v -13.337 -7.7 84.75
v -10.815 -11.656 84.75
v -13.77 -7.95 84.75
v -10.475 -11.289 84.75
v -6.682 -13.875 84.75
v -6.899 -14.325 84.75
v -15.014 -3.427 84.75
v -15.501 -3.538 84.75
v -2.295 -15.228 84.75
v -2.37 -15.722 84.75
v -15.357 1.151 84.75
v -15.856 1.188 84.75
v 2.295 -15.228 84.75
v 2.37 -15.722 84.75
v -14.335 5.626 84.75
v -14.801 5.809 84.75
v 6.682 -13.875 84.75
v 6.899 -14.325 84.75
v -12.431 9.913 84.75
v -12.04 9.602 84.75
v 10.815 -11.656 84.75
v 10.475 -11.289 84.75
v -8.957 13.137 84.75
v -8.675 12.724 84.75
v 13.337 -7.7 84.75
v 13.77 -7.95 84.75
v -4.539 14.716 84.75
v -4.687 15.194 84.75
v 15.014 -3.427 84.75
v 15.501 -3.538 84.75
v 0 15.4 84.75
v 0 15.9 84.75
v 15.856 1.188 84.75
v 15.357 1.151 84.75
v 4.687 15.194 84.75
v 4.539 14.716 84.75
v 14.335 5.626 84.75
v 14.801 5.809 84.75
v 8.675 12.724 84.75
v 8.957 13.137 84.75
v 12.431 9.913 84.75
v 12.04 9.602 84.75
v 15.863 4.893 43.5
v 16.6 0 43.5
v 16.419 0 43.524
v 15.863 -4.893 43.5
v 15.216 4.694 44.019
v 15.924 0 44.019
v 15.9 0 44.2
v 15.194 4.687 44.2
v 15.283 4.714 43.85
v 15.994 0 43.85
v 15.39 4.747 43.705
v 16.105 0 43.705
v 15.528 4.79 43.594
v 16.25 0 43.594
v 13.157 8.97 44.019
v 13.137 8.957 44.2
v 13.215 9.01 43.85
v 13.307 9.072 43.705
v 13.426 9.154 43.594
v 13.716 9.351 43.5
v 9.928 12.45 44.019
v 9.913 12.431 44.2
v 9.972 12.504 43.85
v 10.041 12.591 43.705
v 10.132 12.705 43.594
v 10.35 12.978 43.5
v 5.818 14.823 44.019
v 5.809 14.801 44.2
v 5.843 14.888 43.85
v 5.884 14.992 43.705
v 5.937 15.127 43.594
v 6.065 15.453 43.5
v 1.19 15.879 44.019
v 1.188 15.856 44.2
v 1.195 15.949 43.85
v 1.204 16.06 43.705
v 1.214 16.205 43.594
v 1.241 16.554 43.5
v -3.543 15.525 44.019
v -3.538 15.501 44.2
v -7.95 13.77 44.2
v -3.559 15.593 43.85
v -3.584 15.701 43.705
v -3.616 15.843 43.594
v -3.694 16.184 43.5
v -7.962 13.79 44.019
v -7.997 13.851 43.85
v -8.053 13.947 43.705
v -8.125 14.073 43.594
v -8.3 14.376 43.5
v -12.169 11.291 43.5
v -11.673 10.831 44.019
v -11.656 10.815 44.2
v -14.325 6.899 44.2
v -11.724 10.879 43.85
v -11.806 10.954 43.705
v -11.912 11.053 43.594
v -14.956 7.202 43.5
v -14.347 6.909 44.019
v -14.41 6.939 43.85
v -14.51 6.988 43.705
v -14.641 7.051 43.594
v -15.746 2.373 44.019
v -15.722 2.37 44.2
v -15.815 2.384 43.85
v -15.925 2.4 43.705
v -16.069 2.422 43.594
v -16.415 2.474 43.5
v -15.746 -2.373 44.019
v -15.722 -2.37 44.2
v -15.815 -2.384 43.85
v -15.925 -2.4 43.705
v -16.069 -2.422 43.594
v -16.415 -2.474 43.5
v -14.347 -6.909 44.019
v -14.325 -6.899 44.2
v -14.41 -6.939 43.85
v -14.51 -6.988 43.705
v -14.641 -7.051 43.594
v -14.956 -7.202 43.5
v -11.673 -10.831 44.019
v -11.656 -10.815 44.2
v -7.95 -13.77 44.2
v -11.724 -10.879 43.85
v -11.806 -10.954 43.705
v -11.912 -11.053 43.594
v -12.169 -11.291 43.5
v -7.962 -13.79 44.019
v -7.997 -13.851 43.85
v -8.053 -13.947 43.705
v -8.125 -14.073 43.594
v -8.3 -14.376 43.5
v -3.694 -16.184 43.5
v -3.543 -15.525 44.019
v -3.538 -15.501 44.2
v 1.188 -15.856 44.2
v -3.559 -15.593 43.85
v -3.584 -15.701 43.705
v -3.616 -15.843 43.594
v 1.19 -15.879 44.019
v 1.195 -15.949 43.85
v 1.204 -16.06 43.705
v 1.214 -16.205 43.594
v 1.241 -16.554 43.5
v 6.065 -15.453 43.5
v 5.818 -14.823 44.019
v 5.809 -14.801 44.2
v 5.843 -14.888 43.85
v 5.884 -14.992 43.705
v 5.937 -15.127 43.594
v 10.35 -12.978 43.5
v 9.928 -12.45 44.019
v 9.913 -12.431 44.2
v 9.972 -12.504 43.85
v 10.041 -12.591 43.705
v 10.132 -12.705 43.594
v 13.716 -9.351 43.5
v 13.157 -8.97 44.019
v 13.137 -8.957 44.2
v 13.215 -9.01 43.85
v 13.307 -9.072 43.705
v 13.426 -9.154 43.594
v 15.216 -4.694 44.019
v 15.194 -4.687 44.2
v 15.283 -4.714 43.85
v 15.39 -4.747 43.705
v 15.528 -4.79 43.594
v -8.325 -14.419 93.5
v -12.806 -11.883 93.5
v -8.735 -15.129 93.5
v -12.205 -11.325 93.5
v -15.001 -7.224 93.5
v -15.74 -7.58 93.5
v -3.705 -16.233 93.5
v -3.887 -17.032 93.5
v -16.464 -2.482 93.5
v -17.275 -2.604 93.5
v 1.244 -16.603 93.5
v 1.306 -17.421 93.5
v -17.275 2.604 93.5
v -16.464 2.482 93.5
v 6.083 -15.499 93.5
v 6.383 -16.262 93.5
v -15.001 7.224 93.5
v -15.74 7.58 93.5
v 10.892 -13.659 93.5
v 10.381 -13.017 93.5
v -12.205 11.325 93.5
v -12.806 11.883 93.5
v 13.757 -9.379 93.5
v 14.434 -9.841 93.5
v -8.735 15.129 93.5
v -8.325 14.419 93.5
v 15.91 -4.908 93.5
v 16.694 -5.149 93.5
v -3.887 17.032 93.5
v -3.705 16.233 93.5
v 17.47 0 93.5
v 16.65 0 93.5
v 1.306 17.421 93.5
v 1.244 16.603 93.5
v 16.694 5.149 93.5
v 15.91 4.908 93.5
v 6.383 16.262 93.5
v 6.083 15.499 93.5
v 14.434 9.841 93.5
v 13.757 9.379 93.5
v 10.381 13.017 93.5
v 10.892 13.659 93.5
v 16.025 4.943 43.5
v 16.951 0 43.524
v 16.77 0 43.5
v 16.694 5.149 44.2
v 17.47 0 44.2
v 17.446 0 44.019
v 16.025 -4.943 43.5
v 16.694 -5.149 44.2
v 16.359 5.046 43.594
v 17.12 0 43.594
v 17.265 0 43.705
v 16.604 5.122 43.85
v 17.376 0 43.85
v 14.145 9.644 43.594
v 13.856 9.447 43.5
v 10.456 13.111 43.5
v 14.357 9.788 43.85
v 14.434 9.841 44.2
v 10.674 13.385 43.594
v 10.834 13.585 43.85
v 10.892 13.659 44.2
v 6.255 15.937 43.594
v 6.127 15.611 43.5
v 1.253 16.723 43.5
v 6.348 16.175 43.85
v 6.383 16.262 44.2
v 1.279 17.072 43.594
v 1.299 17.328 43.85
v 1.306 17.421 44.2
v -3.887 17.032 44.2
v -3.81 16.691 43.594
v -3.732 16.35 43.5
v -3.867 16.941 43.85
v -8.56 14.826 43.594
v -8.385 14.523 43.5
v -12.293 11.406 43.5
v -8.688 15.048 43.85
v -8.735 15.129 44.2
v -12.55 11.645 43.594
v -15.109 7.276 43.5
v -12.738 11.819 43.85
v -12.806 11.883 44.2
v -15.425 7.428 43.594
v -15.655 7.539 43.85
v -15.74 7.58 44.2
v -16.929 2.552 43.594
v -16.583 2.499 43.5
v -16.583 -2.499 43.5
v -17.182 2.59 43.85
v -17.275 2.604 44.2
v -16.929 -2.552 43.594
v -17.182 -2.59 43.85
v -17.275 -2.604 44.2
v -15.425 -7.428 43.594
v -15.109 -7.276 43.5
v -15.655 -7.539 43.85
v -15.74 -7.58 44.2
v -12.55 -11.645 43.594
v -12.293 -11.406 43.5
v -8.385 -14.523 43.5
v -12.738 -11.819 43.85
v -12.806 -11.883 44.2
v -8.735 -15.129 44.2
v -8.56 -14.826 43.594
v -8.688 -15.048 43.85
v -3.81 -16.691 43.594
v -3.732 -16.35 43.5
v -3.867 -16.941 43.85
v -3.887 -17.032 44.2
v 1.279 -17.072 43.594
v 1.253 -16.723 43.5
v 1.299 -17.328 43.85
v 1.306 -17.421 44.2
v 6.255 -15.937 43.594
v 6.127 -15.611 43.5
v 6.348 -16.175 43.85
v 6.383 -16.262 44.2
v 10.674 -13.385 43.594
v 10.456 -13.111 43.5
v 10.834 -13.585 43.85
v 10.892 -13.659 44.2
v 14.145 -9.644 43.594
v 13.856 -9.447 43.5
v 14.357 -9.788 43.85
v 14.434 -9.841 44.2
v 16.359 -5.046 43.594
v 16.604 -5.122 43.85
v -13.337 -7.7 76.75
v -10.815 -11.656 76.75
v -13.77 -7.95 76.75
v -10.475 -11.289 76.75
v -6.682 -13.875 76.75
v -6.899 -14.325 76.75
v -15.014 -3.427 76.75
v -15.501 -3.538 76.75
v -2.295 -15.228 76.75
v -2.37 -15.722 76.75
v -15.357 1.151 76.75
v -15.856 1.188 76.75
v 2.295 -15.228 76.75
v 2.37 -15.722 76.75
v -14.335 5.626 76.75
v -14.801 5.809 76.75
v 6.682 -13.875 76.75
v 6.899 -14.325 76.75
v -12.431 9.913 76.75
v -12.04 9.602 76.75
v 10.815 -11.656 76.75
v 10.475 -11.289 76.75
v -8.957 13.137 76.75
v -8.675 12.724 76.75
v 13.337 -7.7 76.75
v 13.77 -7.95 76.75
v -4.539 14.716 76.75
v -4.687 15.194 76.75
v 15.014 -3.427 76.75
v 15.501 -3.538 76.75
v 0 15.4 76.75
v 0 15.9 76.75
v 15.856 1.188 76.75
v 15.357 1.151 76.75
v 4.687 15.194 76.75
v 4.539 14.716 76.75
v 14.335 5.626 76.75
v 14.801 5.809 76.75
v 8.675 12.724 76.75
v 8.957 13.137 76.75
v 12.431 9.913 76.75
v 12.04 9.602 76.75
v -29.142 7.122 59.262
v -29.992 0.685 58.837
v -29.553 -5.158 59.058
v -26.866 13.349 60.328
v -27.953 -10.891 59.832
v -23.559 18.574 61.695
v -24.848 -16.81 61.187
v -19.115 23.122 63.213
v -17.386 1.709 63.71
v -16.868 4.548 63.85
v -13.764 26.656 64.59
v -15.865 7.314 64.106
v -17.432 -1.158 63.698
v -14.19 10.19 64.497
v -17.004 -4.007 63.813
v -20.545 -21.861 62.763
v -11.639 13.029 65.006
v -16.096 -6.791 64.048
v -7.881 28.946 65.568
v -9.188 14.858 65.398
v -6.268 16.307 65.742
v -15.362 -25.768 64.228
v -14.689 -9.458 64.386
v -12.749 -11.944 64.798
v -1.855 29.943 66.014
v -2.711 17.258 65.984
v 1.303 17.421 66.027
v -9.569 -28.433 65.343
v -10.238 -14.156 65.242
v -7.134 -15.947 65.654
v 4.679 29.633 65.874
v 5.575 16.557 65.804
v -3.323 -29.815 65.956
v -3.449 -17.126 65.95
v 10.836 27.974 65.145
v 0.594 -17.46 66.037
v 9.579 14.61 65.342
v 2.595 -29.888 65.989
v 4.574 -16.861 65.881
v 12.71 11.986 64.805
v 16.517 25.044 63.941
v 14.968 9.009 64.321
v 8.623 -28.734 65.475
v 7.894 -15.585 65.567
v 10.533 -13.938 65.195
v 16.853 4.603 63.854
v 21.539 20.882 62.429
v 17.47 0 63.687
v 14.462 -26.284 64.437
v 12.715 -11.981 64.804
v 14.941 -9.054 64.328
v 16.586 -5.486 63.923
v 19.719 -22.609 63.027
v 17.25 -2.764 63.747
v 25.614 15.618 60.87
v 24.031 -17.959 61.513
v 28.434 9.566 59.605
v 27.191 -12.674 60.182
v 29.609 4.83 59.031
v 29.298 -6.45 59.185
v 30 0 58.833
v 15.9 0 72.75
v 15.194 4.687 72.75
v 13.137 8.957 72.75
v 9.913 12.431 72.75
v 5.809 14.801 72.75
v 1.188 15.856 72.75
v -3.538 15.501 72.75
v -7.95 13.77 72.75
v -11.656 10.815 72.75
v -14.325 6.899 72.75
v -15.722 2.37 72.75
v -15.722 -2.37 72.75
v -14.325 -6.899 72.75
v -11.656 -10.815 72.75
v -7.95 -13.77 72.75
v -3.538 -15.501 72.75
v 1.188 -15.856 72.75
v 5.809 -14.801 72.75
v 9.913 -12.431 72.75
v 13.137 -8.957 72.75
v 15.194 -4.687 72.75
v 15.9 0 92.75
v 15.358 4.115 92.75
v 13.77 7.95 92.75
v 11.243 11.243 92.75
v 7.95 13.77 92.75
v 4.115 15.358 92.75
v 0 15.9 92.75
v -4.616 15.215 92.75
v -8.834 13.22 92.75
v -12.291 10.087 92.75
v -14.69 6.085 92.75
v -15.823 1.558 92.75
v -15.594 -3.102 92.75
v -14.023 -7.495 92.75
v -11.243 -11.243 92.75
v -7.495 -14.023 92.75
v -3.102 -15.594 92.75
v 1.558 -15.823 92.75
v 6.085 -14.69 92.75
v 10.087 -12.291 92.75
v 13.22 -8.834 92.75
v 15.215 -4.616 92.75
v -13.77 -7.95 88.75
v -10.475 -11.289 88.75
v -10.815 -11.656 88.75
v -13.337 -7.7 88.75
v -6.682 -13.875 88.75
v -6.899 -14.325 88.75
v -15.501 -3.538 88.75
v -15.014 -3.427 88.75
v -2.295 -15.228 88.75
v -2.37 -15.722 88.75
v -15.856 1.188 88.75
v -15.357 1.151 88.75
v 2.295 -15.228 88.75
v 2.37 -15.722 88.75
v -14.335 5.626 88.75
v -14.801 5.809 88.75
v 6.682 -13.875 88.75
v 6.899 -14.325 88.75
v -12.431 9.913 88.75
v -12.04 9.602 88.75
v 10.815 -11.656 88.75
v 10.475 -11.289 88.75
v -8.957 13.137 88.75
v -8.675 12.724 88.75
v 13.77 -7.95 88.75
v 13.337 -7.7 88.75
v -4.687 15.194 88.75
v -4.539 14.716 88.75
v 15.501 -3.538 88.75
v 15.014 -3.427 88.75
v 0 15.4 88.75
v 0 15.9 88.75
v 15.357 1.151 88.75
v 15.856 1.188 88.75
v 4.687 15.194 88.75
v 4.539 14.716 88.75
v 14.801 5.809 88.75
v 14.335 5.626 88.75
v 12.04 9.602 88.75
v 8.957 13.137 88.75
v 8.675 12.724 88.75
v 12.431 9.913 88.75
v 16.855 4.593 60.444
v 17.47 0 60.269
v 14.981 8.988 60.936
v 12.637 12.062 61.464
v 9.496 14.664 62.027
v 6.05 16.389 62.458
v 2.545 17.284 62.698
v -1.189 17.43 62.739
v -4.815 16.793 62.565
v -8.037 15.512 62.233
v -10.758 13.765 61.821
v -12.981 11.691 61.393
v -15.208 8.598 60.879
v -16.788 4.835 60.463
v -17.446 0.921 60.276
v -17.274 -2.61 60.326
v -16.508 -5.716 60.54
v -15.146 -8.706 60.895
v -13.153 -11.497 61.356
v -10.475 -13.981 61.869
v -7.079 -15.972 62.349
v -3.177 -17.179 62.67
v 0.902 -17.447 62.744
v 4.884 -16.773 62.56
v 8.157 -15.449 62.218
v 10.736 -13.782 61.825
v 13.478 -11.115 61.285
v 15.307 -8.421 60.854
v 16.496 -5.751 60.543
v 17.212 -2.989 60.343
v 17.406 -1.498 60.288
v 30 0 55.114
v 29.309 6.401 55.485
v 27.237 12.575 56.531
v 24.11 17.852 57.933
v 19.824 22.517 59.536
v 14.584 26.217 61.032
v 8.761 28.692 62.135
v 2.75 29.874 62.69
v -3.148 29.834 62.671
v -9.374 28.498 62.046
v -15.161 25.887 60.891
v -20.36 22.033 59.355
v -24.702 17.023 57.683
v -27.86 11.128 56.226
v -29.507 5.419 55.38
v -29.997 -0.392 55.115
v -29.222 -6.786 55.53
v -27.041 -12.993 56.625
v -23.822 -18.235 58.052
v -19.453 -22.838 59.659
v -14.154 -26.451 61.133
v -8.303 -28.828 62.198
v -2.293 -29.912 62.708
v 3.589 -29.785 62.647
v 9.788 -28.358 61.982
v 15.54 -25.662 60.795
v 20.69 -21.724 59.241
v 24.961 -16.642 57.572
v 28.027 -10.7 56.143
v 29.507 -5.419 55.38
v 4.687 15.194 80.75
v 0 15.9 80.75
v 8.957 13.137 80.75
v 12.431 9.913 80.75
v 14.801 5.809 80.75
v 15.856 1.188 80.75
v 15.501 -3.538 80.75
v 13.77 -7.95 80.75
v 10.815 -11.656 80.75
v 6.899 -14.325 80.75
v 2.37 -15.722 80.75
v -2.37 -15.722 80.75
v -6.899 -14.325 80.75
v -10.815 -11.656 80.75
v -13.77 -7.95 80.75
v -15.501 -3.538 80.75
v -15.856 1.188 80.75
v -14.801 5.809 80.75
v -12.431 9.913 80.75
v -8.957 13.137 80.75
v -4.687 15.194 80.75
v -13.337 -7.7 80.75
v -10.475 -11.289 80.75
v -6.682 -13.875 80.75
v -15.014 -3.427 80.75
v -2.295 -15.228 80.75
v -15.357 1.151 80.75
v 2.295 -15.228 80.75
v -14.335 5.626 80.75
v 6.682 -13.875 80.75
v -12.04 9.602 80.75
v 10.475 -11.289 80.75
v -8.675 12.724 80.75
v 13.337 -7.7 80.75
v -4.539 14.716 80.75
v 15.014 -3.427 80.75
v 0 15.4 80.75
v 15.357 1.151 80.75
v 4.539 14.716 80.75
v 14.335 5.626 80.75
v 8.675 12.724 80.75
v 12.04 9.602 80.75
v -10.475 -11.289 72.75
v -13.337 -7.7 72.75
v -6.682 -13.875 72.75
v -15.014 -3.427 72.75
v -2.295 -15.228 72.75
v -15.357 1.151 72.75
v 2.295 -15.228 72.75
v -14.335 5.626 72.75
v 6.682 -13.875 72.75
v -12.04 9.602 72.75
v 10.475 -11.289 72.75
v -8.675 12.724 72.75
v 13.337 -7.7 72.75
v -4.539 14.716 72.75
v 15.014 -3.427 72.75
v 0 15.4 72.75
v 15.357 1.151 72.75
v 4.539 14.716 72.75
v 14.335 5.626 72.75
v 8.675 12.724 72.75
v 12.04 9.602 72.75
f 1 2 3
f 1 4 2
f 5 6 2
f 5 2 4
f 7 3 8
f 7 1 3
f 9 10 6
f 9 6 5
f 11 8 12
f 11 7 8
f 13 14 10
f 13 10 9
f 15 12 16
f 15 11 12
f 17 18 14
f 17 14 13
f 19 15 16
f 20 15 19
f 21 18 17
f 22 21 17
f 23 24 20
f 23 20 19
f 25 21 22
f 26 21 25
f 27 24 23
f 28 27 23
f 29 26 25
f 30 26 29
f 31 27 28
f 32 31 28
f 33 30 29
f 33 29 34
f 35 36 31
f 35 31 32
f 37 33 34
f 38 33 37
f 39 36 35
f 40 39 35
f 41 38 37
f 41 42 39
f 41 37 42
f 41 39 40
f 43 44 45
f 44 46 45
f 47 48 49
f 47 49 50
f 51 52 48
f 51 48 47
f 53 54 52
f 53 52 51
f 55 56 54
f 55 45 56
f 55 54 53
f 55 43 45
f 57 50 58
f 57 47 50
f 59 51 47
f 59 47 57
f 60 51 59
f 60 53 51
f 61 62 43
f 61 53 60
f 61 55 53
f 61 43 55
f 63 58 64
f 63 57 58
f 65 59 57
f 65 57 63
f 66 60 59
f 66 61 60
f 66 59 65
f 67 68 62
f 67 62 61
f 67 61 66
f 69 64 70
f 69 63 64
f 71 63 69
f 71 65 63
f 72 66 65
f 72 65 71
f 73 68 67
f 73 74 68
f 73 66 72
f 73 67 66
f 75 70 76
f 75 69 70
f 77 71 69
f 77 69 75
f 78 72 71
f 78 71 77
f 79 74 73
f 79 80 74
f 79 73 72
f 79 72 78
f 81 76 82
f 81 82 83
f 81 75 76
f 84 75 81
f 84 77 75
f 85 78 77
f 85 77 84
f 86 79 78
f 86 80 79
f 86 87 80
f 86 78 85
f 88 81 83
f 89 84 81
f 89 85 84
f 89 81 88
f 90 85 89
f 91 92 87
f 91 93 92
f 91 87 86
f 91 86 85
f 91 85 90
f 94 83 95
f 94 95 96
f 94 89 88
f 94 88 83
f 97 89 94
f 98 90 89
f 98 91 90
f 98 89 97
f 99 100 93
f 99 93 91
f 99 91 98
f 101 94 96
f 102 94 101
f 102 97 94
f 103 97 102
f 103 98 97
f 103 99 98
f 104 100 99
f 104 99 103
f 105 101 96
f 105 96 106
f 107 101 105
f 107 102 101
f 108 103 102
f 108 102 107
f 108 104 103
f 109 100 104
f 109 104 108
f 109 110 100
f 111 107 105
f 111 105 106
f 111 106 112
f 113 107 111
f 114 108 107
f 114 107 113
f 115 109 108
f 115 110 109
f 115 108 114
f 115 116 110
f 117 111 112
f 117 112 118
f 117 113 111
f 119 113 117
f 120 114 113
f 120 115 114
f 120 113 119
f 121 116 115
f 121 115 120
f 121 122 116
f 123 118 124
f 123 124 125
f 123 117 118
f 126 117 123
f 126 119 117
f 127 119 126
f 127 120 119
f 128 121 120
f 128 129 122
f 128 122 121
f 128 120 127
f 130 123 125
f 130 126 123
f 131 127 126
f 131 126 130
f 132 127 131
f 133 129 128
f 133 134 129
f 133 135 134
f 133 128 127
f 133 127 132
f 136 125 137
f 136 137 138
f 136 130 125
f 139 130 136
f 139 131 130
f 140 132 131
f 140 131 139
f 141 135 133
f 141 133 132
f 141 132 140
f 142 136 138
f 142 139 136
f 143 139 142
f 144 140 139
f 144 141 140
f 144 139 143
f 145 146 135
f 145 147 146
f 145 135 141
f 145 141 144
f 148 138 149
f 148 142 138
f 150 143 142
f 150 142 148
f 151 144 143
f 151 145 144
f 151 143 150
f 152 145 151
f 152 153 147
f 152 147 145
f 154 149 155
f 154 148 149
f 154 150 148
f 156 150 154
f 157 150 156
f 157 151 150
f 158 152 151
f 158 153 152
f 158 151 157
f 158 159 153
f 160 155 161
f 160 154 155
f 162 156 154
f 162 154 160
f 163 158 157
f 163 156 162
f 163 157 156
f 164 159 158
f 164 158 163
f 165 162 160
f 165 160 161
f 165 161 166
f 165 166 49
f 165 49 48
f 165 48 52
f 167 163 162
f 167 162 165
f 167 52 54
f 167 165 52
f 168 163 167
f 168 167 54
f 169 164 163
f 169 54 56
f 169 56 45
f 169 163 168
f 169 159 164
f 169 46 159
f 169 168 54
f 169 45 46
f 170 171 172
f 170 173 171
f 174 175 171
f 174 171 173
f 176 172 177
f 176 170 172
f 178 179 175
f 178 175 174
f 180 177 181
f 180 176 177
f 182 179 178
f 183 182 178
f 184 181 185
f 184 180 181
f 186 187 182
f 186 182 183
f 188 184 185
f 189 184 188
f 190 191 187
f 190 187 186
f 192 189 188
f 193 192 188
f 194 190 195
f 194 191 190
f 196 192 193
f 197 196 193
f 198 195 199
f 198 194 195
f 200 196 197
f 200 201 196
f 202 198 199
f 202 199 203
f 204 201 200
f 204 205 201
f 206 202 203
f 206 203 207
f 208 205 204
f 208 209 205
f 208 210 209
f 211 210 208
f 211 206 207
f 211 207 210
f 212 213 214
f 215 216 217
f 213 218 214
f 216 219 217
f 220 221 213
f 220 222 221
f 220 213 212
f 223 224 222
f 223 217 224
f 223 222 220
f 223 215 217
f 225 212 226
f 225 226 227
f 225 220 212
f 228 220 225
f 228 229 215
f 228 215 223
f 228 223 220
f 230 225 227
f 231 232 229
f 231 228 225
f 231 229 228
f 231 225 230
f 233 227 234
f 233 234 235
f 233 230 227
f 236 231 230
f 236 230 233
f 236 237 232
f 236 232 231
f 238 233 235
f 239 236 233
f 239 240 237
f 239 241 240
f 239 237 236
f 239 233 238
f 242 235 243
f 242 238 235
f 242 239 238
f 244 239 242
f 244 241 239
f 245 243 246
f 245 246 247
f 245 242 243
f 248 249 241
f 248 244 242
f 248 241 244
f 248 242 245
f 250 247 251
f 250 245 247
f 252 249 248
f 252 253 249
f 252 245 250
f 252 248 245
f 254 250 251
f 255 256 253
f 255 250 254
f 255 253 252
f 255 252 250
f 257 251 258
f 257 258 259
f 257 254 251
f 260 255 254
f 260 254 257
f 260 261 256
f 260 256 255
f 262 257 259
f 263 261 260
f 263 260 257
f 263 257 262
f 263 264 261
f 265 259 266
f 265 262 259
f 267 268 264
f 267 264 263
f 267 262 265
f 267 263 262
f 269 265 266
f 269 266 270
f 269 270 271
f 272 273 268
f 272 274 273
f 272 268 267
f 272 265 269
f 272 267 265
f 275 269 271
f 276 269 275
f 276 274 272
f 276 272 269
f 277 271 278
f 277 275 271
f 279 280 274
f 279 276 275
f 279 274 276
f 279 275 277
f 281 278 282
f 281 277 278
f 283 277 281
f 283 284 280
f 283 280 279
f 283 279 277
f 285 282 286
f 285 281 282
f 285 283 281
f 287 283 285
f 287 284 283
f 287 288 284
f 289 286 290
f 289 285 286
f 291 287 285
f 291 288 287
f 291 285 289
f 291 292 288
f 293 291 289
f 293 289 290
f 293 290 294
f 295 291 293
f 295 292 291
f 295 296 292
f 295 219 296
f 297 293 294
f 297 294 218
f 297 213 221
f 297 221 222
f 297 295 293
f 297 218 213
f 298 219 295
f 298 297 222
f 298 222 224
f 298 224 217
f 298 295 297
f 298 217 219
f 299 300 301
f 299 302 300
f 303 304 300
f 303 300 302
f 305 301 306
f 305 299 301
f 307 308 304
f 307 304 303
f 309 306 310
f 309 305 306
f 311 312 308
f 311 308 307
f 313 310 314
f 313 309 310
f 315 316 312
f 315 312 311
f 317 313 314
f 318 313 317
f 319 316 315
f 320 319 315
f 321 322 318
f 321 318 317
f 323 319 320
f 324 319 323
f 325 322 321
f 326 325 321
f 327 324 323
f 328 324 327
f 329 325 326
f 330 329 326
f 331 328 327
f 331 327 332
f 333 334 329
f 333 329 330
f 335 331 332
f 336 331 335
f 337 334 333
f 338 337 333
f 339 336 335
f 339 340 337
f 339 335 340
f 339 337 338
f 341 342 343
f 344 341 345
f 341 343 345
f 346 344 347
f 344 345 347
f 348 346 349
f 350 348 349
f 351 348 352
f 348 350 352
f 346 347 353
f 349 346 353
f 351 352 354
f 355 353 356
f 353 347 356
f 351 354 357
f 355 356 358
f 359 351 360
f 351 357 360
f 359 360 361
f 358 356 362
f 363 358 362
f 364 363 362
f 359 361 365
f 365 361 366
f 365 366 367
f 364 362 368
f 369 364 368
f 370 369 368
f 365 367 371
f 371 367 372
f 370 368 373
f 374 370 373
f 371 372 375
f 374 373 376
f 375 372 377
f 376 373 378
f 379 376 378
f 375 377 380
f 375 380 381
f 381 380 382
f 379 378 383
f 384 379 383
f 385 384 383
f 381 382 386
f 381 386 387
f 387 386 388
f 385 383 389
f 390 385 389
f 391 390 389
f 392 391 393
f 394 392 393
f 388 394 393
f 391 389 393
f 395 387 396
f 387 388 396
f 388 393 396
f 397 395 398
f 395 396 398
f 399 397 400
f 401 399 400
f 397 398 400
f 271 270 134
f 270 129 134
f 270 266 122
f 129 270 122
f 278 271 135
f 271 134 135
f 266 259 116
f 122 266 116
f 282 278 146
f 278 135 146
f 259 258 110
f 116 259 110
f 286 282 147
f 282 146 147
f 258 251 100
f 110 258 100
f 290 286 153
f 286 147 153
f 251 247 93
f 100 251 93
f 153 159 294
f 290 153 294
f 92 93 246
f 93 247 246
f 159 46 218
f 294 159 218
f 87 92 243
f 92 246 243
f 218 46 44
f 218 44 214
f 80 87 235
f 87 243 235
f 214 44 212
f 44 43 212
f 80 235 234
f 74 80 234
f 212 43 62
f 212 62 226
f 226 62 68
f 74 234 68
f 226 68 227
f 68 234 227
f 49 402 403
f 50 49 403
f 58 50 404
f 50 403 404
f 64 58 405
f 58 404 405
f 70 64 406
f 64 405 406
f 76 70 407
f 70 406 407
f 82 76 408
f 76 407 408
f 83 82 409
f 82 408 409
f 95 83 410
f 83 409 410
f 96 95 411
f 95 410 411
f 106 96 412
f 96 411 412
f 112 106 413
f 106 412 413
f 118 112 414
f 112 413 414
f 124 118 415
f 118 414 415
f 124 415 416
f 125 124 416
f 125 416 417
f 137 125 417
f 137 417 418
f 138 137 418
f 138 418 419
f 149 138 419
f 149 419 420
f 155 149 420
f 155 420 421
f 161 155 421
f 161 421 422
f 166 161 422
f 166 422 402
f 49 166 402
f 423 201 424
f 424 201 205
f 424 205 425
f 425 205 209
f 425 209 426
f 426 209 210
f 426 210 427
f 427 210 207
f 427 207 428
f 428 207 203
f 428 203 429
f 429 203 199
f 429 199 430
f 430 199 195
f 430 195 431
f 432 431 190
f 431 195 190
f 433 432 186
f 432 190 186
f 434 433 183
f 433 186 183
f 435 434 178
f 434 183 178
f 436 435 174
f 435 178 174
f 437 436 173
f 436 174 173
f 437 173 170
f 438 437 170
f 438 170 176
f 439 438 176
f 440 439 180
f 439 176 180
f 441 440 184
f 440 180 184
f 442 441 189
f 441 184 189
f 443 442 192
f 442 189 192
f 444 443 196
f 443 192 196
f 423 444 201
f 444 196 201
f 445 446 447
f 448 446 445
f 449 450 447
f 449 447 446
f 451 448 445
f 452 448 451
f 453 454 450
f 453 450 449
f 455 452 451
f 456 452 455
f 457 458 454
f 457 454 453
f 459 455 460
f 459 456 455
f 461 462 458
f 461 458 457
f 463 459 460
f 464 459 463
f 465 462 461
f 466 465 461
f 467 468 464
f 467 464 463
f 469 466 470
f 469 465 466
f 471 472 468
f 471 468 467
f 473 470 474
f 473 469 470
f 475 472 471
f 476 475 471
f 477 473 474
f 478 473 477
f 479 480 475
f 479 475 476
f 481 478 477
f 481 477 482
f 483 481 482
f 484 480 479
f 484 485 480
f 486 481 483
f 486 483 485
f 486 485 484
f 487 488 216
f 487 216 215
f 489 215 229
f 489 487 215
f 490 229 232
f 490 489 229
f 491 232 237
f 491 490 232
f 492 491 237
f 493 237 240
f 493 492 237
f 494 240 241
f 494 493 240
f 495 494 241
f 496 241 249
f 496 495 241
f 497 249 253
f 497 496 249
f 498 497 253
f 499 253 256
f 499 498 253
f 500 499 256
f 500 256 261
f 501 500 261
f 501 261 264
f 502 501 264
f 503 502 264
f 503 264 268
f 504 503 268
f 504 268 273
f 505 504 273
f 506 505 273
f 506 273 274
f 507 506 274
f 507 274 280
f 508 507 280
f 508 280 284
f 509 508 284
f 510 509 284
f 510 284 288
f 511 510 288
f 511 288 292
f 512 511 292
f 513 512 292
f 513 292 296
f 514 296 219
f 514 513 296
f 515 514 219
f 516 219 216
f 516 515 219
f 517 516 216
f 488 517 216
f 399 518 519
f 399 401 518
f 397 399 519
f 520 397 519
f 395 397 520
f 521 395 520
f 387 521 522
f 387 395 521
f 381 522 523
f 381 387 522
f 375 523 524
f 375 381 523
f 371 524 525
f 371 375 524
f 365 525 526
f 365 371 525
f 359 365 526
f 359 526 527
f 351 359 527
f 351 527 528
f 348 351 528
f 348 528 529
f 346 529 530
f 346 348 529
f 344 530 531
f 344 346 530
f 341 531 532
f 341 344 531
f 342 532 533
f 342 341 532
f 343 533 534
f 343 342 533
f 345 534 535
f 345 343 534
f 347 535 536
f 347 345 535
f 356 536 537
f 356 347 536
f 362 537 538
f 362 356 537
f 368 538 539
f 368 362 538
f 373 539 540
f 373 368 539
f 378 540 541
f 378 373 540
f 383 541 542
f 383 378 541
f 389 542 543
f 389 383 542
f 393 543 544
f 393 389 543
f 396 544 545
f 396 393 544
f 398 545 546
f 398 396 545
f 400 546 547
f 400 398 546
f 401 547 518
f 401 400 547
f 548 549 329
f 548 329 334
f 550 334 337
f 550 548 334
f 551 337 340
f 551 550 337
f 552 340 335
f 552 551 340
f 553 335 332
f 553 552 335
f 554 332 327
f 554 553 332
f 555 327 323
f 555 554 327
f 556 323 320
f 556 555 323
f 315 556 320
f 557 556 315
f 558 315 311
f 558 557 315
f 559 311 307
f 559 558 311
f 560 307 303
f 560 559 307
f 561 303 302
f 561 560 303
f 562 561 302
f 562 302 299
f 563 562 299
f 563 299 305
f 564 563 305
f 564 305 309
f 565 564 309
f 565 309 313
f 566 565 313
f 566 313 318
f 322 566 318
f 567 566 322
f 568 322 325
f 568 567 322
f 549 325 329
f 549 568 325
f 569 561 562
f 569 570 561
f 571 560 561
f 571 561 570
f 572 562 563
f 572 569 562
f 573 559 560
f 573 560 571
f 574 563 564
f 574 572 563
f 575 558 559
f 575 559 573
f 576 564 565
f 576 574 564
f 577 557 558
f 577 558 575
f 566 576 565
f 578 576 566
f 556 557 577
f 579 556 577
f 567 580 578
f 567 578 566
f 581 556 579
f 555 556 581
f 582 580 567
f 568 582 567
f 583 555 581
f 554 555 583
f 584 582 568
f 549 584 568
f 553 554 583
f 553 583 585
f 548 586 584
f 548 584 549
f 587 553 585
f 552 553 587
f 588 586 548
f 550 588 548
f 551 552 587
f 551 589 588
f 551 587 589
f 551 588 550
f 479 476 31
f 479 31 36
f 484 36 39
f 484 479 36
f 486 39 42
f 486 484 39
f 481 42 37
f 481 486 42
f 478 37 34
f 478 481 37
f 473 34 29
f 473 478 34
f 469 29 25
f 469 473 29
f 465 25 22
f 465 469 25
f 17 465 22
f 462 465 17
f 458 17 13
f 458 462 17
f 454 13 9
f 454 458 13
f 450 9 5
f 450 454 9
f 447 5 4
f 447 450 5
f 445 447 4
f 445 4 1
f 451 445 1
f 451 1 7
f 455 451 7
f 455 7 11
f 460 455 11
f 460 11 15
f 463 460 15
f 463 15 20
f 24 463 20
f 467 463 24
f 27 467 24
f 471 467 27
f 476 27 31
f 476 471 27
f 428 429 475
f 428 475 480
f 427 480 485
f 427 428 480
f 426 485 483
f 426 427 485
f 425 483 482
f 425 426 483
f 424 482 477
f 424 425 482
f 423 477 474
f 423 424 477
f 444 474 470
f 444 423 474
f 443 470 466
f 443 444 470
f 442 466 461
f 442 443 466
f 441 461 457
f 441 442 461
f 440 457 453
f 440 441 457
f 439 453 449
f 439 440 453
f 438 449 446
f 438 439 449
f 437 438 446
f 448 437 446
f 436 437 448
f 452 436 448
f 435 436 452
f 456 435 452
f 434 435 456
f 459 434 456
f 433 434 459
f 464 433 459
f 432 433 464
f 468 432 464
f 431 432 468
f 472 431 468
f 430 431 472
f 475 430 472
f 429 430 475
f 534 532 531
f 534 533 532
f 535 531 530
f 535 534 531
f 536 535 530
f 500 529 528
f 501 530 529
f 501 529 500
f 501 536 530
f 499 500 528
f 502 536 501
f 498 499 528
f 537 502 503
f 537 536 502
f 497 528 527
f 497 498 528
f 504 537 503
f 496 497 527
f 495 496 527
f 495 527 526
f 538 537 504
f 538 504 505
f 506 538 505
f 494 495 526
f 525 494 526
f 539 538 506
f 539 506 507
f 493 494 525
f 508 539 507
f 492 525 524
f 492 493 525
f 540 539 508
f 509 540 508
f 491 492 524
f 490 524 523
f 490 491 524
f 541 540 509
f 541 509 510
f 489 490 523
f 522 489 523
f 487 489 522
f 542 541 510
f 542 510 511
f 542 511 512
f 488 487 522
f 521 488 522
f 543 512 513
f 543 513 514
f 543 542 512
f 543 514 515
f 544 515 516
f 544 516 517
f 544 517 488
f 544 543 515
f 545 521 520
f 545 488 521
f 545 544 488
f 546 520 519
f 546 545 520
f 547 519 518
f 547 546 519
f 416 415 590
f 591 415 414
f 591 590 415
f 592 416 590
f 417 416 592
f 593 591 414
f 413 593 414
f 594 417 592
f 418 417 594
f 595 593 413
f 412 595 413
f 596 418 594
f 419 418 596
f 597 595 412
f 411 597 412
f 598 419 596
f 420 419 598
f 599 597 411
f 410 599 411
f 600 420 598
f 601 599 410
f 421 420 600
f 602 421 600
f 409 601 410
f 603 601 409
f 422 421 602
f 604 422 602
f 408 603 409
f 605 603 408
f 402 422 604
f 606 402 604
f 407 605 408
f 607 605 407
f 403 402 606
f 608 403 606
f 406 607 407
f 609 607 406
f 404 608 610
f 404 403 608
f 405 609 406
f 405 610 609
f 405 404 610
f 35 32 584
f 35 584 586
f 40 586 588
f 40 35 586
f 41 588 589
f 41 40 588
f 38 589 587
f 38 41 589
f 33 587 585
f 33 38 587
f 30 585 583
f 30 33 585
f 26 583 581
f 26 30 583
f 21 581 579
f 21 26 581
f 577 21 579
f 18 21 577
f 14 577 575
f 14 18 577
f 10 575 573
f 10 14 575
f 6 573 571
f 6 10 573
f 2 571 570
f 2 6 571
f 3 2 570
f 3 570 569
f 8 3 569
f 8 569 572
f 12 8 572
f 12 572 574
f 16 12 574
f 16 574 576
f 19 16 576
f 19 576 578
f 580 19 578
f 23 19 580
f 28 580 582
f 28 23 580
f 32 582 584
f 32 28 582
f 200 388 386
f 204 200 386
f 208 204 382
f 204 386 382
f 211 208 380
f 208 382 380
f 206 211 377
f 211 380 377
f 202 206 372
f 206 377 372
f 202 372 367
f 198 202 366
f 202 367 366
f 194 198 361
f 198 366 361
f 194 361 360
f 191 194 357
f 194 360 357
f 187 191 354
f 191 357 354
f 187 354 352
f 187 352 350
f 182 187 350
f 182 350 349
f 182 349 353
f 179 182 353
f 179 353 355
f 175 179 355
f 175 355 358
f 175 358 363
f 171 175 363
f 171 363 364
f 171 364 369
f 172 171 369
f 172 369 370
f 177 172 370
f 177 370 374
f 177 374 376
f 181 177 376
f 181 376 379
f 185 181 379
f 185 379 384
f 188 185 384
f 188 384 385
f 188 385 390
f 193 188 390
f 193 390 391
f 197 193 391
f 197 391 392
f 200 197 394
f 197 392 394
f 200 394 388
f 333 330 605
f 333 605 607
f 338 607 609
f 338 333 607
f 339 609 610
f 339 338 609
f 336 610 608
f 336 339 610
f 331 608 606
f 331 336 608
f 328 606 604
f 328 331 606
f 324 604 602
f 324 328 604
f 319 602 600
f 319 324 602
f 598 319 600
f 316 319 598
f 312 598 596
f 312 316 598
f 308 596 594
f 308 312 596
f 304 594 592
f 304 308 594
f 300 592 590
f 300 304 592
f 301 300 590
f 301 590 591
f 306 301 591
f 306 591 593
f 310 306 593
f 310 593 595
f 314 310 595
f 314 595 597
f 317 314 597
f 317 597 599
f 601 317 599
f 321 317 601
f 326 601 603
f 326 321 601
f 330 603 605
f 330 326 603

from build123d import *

# Parameters (mm, degrees)
SKETCH2_R                = 30
BOSS_EXTRUDE4_DEPTH      = 2.54
BOSS_EXTRUDE4_DEPTH_BACK = 12.7
SKETCH1_R                = 62.75
CUT_EXTRUDE5_DEPTH       = 31
CUT_EXTRUDE5_DEPTH_BACK  = 31
CUT_EXTRUDE6_DEPTH       = 31.0000001
CUT_EXTRUDE6_DEPTH_BACK  = 31.0000001
SKETCH12_R               = 17.47
BOSS_EXTRUDE7_DEPTH      = 30
BOSS_EXTRUDE7_DEPTH_BACK = 20
SKETCH20_R               = 15.9
CUT_EXTRUDE8_DEPTH       = 51.0000001
CHAMFER1_SIZE            = 0.75
FILLET1_R                = 0.7
LPATTERN1_COUNT          = 5
LPATTERN1_PITCH          = 4


with BuildPart() as part:
    # Sketch2 → Boss-Extrude4 (new body, two sides)
    with BuildSketch(Plane.XY.offset(63.5)) as boss_extrude4_sk:
        Circle(SKETCH2_R)
    extrude(amount=BOSS_EXTRUDE4_DEPTH)
    extrude(boss_extrude4_sk.sketch, amount=-BOSS_EXTRUDE4_DEPTH_BACK)

    # Sketch1 → Cut-Extrude5 (cut, two sides)
    with BuildSketch(Plane(origin=(0, 0, 0), x_dir=(1, 0, 0), z_dir=(0, 1, 0))) as cut_extrude5_sk:
        Circle(SKETCH1_R)
    extrude(amount=CUT_EXTRUDE5_DEPTH, mode=Mode.SUBTRACT)
    extrude(cut_extrude5_sk.sketch, amount=-CUT_EXTRUDE5_DEPTH_BACK, mode=Mode.SUBTRACT)

    # Sketch11 → Cut-Extrude6 (cut, two sides)
    with BuildSketch(Plane(origin=(0, 0, 0), x_dir=(1, 0, 0), z_dir=(0, 1, 0))) as cut_extrude6_sk:
        with BuildLine():
            Line((31.285011062, -58.15951928), (31.285011062, -70.975470201))
            Line((31.285011062, -70.975470201), (-30.859364653, -70.975470201))
            Line((-30.859364653, -70.975470201), (-30.859364653, -58.386481425))
            ThreePointArc((-30.859364653, -58.386481425), (0.241188039, -66.039559571), (31.285011062, -58.15951928))
        make_face()
    extrude(amount=CUT_EXTRUDE6_DEPTH, mode=Mode.SUBTRACT)
    extrude(cut_extrude6_sk.sketch, amount=-CUT_EXTRUDE6_DEPTH_BACK, mode=Mode.SUBTRACT)

    # Sketch12 → Boss-Extrude7 (add, two sides)
    with BuildSketch(Plane.XY.offset(63.5)) as boss_extrude7_sk:
        Circle(SKETCH12_R)
    extrude(amount=BOSS_EXTRUDE7_DEPTH)
    extrude(boss_extrude7_sk.sketch, amount=-BOSS_EXTRUDE7_DEPTH_BACK)

    # Sketch20 → Cut-Extrude8 (cut, through all)
    with BuildSketch(Plane.XY.offset(93.5)):
        Circle(SKETCH20_R)
    extrude(amount=-CUT_EXTRUDE8_DEPTH, mode=Mode.SUBTRACT)

    # Chamfer1
    chamfer1_edges = [part.edges().sort_by_distance(p)[0] for p in [
        (-15.9, 0, 93.5),
    ]]
    chamfer(chamfer1_edges, length=CHAMFER1_SIZE)

    # Fillet1
    fillet1_edges = [part.edges().sort_by_distance(p)[0] for p in [
        (-17.47, 0, 43.5),
        (-15.9, 0, 43.5),
    ]]
    fillet(fillet1_edges, radius=FILLET1_R)

    # Sketch23 → Revolve1 (revolve)
    with BuildSketch(Plane(origin=(0, 0, 0), x_dir=(0, 0, -1), z_dir=(1, 0, 0))):
        Polygon((-92.75, 15.9), (-88.75, 15.9), (-88.75, 15.4), align=None)
    revolve1 = revolve(axis=Axis((0, 0, 93.5), (0, 0, -1)))

    # LPattern1: Revolve1 ×5
    with Locations(*[(0, 0, -i * LPATTERN1_PITCH) for i in range(1, LPATTERN1_COUNT)]):
        add(revolve1)


solid = part.part
